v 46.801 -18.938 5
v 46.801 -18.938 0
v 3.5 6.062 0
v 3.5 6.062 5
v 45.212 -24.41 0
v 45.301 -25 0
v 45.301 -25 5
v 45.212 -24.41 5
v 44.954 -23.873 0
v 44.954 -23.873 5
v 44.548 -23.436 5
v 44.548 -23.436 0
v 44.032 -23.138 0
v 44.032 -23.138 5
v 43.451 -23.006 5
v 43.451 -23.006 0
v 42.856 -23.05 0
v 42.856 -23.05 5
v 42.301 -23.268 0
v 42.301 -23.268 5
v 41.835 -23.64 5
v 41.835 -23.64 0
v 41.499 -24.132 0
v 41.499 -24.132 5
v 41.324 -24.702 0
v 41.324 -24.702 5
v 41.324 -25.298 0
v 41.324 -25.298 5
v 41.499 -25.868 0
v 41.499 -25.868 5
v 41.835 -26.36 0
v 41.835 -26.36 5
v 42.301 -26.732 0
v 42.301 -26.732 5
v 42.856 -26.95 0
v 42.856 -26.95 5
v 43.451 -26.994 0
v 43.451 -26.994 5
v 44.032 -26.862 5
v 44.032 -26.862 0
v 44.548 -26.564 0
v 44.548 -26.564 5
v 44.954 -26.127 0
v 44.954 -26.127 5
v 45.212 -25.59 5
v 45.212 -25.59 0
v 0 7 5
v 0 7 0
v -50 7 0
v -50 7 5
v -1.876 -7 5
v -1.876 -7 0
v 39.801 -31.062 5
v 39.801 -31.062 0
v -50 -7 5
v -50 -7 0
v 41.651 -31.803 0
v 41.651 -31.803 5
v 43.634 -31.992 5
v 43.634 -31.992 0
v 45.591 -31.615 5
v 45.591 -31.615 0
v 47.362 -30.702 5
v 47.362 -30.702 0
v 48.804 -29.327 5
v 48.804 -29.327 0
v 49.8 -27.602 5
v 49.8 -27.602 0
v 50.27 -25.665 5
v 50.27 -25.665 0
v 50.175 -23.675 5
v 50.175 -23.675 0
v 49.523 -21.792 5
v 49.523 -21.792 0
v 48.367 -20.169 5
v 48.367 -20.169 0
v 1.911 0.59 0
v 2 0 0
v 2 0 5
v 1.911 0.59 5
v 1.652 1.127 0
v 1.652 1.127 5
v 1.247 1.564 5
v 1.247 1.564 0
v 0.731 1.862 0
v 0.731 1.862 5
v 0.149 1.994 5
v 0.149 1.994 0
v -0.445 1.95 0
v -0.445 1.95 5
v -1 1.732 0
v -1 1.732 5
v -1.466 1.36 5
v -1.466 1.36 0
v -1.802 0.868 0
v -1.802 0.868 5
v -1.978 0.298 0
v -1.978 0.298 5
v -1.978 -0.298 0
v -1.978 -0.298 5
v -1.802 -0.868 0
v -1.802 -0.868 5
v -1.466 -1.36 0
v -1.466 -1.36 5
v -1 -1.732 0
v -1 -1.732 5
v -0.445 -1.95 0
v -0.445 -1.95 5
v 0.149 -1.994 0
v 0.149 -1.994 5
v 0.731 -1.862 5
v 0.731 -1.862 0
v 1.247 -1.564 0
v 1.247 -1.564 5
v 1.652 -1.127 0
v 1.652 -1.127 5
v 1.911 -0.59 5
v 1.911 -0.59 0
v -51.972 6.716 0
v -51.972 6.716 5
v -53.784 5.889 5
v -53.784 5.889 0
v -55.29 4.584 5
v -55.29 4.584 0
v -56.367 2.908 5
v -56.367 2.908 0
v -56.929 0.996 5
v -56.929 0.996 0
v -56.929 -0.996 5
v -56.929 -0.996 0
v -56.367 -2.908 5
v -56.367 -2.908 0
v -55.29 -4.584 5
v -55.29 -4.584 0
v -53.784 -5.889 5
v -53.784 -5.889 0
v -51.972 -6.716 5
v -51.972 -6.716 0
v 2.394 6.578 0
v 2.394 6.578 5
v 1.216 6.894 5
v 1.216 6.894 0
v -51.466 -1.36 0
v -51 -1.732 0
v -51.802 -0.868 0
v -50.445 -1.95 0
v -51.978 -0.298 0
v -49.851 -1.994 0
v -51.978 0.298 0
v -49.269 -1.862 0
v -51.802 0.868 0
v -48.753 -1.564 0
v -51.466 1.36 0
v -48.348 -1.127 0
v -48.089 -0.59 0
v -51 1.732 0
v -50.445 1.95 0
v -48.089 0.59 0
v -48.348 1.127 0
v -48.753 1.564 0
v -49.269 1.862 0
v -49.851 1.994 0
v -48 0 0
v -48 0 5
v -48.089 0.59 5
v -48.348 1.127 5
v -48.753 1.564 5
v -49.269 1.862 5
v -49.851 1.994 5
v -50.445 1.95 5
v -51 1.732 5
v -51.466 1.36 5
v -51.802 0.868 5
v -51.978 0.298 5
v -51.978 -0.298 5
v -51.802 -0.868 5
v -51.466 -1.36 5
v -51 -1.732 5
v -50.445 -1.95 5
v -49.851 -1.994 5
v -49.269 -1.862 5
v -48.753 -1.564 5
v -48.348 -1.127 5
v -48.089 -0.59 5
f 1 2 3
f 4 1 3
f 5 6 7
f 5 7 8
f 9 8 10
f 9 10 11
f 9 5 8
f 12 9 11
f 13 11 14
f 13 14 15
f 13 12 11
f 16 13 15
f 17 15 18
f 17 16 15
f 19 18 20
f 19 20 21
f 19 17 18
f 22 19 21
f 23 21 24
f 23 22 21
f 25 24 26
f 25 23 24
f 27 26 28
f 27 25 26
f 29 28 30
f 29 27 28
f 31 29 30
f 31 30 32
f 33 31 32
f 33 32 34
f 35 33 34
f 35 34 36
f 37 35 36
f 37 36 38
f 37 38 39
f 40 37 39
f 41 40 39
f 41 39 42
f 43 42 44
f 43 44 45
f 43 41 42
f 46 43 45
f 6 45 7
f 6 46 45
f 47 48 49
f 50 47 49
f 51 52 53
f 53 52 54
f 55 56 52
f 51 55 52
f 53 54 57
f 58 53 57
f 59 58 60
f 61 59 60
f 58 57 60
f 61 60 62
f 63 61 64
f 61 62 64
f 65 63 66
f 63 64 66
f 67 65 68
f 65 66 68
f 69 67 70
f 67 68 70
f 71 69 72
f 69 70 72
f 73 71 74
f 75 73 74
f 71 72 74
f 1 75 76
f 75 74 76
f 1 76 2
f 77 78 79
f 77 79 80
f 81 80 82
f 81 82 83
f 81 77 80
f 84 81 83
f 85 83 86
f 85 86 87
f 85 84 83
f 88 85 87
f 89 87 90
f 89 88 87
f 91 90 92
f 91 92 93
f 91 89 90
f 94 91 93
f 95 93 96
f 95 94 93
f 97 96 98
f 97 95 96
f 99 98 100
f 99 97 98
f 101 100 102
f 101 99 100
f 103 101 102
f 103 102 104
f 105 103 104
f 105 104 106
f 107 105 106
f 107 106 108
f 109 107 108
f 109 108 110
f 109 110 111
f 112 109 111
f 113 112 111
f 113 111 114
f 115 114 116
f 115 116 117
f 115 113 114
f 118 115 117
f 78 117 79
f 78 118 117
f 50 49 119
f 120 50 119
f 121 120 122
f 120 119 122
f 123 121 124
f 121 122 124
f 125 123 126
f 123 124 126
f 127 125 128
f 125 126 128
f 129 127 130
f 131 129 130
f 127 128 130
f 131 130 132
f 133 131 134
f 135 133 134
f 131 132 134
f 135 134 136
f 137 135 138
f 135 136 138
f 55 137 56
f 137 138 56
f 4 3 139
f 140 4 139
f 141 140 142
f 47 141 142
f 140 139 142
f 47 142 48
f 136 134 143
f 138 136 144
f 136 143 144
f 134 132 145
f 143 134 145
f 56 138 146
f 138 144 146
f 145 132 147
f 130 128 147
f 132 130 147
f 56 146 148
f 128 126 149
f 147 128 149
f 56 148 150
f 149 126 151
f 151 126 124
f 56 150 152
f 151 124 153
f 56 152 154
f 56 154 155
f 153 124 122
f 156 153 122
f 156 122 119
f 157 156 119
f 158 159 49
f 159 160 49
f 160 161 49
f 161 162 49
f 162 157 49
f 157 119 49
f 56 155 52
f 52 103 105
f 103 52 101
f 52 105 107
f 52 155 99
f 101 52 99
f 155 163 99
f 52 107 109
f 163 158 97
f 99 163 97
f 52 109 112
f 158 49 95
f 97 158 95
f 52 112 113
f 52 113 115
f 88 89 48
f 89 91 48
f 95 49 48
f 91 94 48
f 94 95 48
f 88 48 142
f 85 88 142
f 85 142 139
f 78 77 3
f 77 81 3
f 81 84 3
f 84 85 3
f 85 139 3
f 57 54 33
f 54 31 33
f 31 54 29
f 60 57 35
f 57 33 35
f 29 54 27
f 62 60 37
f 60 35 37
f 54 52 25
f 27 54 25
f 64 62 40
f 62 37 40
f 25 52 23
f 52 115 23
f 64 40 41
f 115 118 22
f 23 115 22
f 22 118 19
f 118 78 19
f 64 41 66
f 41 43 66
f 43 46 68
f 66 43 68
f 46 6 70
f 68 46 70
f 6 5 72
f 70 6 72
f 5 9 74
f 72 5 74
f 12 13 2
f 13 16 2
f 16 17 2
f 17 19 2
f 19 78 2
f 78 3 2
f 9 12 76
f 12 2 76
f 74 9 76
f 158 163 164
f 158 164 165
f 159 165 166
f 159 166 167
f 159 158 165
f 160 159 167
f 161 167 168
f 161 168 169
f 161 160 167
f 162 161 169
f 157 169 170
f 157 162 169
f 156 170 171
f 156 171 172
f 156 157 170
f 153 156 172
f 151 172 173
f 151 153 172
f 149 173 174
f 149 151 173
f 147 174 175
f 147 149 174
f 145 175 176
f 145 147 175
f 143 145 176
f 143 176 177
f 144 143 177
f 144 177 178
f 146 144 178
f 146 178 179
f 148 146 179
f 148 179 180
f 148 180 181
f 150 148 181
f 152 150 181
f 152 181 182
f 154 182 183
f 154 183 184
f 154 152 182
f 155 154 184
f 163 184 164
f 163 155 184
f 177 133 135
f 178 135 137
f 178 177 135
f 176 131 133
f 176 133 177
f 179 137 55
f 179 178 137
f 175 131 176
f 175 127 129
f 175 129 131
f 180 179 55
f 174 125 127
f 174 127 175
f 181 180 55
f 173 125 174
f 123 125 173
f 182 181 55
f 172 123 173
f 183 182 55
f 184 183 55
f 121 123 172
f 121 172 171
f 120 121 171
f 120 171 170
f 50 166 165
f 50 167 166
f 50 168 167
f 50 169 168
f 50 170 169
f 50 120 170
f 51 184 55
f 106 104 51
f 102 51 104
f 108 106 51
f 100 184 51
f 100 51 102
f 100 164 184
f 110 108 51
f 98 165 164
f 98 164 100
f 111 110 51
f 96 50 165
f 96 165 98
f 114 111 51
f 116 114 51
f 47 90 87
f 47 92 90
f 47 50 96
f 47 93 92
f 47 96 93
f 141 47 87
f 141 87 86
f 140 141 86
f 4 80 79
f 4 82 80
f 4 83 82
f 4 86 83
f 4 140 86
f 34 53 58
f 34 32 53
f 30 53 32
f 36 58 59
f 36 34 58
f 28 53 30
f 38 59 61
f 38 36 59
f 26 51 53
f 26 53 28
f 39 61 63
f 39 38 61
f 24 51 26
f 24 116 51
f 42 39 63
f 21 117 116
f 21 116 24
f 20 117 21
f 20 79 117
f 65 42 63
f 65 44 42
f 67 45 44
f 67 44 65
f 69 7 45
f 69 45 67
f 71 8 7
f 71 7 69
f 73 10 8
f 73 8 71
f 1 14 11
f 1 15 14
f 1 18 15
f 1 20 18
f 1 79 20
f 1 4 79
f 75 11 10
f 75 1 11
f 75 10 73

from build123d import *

# Parameters (mm, degrees)
F0_R     = 2
F1_DEPTH = 5


with BuildPart() as f1:
    # F0 (on Top) → F1 (new body)
    with BuildSketch(Plane.XY):
        with BuildLine():
            ThreePointArc((-50, 7), (-57, 0), (-50, -7))
            Line((-50, -7), (-1.875644, -7))
            Line((-1.875644, -7), (39.80127, -31.062178))
            ThreePointArc((39.80127, -31.062178), (49.363448, -28.5), (46.80127, -18.937822))
            Line((46.80127, -18.937822), (3.5, 6.062178))
            ThreePointArc((3.5, 6.062178), (1.811733, 6.761481), (0, 7))
            Line((0, 7), (-50, 7))
        make_face()
        with Locations((43.30127, -25)):
            Circle(F0_R, mode=Mode.SUBTRACT)
        with Locations((-50, 0)):
            Circle(F0_R, mode=Mode.SUBTRACT)
        Circle(F0_R, mode=Mode.SUBTRACT)
    extrude(amount=F1_DEPTH)


solid = f1.part
